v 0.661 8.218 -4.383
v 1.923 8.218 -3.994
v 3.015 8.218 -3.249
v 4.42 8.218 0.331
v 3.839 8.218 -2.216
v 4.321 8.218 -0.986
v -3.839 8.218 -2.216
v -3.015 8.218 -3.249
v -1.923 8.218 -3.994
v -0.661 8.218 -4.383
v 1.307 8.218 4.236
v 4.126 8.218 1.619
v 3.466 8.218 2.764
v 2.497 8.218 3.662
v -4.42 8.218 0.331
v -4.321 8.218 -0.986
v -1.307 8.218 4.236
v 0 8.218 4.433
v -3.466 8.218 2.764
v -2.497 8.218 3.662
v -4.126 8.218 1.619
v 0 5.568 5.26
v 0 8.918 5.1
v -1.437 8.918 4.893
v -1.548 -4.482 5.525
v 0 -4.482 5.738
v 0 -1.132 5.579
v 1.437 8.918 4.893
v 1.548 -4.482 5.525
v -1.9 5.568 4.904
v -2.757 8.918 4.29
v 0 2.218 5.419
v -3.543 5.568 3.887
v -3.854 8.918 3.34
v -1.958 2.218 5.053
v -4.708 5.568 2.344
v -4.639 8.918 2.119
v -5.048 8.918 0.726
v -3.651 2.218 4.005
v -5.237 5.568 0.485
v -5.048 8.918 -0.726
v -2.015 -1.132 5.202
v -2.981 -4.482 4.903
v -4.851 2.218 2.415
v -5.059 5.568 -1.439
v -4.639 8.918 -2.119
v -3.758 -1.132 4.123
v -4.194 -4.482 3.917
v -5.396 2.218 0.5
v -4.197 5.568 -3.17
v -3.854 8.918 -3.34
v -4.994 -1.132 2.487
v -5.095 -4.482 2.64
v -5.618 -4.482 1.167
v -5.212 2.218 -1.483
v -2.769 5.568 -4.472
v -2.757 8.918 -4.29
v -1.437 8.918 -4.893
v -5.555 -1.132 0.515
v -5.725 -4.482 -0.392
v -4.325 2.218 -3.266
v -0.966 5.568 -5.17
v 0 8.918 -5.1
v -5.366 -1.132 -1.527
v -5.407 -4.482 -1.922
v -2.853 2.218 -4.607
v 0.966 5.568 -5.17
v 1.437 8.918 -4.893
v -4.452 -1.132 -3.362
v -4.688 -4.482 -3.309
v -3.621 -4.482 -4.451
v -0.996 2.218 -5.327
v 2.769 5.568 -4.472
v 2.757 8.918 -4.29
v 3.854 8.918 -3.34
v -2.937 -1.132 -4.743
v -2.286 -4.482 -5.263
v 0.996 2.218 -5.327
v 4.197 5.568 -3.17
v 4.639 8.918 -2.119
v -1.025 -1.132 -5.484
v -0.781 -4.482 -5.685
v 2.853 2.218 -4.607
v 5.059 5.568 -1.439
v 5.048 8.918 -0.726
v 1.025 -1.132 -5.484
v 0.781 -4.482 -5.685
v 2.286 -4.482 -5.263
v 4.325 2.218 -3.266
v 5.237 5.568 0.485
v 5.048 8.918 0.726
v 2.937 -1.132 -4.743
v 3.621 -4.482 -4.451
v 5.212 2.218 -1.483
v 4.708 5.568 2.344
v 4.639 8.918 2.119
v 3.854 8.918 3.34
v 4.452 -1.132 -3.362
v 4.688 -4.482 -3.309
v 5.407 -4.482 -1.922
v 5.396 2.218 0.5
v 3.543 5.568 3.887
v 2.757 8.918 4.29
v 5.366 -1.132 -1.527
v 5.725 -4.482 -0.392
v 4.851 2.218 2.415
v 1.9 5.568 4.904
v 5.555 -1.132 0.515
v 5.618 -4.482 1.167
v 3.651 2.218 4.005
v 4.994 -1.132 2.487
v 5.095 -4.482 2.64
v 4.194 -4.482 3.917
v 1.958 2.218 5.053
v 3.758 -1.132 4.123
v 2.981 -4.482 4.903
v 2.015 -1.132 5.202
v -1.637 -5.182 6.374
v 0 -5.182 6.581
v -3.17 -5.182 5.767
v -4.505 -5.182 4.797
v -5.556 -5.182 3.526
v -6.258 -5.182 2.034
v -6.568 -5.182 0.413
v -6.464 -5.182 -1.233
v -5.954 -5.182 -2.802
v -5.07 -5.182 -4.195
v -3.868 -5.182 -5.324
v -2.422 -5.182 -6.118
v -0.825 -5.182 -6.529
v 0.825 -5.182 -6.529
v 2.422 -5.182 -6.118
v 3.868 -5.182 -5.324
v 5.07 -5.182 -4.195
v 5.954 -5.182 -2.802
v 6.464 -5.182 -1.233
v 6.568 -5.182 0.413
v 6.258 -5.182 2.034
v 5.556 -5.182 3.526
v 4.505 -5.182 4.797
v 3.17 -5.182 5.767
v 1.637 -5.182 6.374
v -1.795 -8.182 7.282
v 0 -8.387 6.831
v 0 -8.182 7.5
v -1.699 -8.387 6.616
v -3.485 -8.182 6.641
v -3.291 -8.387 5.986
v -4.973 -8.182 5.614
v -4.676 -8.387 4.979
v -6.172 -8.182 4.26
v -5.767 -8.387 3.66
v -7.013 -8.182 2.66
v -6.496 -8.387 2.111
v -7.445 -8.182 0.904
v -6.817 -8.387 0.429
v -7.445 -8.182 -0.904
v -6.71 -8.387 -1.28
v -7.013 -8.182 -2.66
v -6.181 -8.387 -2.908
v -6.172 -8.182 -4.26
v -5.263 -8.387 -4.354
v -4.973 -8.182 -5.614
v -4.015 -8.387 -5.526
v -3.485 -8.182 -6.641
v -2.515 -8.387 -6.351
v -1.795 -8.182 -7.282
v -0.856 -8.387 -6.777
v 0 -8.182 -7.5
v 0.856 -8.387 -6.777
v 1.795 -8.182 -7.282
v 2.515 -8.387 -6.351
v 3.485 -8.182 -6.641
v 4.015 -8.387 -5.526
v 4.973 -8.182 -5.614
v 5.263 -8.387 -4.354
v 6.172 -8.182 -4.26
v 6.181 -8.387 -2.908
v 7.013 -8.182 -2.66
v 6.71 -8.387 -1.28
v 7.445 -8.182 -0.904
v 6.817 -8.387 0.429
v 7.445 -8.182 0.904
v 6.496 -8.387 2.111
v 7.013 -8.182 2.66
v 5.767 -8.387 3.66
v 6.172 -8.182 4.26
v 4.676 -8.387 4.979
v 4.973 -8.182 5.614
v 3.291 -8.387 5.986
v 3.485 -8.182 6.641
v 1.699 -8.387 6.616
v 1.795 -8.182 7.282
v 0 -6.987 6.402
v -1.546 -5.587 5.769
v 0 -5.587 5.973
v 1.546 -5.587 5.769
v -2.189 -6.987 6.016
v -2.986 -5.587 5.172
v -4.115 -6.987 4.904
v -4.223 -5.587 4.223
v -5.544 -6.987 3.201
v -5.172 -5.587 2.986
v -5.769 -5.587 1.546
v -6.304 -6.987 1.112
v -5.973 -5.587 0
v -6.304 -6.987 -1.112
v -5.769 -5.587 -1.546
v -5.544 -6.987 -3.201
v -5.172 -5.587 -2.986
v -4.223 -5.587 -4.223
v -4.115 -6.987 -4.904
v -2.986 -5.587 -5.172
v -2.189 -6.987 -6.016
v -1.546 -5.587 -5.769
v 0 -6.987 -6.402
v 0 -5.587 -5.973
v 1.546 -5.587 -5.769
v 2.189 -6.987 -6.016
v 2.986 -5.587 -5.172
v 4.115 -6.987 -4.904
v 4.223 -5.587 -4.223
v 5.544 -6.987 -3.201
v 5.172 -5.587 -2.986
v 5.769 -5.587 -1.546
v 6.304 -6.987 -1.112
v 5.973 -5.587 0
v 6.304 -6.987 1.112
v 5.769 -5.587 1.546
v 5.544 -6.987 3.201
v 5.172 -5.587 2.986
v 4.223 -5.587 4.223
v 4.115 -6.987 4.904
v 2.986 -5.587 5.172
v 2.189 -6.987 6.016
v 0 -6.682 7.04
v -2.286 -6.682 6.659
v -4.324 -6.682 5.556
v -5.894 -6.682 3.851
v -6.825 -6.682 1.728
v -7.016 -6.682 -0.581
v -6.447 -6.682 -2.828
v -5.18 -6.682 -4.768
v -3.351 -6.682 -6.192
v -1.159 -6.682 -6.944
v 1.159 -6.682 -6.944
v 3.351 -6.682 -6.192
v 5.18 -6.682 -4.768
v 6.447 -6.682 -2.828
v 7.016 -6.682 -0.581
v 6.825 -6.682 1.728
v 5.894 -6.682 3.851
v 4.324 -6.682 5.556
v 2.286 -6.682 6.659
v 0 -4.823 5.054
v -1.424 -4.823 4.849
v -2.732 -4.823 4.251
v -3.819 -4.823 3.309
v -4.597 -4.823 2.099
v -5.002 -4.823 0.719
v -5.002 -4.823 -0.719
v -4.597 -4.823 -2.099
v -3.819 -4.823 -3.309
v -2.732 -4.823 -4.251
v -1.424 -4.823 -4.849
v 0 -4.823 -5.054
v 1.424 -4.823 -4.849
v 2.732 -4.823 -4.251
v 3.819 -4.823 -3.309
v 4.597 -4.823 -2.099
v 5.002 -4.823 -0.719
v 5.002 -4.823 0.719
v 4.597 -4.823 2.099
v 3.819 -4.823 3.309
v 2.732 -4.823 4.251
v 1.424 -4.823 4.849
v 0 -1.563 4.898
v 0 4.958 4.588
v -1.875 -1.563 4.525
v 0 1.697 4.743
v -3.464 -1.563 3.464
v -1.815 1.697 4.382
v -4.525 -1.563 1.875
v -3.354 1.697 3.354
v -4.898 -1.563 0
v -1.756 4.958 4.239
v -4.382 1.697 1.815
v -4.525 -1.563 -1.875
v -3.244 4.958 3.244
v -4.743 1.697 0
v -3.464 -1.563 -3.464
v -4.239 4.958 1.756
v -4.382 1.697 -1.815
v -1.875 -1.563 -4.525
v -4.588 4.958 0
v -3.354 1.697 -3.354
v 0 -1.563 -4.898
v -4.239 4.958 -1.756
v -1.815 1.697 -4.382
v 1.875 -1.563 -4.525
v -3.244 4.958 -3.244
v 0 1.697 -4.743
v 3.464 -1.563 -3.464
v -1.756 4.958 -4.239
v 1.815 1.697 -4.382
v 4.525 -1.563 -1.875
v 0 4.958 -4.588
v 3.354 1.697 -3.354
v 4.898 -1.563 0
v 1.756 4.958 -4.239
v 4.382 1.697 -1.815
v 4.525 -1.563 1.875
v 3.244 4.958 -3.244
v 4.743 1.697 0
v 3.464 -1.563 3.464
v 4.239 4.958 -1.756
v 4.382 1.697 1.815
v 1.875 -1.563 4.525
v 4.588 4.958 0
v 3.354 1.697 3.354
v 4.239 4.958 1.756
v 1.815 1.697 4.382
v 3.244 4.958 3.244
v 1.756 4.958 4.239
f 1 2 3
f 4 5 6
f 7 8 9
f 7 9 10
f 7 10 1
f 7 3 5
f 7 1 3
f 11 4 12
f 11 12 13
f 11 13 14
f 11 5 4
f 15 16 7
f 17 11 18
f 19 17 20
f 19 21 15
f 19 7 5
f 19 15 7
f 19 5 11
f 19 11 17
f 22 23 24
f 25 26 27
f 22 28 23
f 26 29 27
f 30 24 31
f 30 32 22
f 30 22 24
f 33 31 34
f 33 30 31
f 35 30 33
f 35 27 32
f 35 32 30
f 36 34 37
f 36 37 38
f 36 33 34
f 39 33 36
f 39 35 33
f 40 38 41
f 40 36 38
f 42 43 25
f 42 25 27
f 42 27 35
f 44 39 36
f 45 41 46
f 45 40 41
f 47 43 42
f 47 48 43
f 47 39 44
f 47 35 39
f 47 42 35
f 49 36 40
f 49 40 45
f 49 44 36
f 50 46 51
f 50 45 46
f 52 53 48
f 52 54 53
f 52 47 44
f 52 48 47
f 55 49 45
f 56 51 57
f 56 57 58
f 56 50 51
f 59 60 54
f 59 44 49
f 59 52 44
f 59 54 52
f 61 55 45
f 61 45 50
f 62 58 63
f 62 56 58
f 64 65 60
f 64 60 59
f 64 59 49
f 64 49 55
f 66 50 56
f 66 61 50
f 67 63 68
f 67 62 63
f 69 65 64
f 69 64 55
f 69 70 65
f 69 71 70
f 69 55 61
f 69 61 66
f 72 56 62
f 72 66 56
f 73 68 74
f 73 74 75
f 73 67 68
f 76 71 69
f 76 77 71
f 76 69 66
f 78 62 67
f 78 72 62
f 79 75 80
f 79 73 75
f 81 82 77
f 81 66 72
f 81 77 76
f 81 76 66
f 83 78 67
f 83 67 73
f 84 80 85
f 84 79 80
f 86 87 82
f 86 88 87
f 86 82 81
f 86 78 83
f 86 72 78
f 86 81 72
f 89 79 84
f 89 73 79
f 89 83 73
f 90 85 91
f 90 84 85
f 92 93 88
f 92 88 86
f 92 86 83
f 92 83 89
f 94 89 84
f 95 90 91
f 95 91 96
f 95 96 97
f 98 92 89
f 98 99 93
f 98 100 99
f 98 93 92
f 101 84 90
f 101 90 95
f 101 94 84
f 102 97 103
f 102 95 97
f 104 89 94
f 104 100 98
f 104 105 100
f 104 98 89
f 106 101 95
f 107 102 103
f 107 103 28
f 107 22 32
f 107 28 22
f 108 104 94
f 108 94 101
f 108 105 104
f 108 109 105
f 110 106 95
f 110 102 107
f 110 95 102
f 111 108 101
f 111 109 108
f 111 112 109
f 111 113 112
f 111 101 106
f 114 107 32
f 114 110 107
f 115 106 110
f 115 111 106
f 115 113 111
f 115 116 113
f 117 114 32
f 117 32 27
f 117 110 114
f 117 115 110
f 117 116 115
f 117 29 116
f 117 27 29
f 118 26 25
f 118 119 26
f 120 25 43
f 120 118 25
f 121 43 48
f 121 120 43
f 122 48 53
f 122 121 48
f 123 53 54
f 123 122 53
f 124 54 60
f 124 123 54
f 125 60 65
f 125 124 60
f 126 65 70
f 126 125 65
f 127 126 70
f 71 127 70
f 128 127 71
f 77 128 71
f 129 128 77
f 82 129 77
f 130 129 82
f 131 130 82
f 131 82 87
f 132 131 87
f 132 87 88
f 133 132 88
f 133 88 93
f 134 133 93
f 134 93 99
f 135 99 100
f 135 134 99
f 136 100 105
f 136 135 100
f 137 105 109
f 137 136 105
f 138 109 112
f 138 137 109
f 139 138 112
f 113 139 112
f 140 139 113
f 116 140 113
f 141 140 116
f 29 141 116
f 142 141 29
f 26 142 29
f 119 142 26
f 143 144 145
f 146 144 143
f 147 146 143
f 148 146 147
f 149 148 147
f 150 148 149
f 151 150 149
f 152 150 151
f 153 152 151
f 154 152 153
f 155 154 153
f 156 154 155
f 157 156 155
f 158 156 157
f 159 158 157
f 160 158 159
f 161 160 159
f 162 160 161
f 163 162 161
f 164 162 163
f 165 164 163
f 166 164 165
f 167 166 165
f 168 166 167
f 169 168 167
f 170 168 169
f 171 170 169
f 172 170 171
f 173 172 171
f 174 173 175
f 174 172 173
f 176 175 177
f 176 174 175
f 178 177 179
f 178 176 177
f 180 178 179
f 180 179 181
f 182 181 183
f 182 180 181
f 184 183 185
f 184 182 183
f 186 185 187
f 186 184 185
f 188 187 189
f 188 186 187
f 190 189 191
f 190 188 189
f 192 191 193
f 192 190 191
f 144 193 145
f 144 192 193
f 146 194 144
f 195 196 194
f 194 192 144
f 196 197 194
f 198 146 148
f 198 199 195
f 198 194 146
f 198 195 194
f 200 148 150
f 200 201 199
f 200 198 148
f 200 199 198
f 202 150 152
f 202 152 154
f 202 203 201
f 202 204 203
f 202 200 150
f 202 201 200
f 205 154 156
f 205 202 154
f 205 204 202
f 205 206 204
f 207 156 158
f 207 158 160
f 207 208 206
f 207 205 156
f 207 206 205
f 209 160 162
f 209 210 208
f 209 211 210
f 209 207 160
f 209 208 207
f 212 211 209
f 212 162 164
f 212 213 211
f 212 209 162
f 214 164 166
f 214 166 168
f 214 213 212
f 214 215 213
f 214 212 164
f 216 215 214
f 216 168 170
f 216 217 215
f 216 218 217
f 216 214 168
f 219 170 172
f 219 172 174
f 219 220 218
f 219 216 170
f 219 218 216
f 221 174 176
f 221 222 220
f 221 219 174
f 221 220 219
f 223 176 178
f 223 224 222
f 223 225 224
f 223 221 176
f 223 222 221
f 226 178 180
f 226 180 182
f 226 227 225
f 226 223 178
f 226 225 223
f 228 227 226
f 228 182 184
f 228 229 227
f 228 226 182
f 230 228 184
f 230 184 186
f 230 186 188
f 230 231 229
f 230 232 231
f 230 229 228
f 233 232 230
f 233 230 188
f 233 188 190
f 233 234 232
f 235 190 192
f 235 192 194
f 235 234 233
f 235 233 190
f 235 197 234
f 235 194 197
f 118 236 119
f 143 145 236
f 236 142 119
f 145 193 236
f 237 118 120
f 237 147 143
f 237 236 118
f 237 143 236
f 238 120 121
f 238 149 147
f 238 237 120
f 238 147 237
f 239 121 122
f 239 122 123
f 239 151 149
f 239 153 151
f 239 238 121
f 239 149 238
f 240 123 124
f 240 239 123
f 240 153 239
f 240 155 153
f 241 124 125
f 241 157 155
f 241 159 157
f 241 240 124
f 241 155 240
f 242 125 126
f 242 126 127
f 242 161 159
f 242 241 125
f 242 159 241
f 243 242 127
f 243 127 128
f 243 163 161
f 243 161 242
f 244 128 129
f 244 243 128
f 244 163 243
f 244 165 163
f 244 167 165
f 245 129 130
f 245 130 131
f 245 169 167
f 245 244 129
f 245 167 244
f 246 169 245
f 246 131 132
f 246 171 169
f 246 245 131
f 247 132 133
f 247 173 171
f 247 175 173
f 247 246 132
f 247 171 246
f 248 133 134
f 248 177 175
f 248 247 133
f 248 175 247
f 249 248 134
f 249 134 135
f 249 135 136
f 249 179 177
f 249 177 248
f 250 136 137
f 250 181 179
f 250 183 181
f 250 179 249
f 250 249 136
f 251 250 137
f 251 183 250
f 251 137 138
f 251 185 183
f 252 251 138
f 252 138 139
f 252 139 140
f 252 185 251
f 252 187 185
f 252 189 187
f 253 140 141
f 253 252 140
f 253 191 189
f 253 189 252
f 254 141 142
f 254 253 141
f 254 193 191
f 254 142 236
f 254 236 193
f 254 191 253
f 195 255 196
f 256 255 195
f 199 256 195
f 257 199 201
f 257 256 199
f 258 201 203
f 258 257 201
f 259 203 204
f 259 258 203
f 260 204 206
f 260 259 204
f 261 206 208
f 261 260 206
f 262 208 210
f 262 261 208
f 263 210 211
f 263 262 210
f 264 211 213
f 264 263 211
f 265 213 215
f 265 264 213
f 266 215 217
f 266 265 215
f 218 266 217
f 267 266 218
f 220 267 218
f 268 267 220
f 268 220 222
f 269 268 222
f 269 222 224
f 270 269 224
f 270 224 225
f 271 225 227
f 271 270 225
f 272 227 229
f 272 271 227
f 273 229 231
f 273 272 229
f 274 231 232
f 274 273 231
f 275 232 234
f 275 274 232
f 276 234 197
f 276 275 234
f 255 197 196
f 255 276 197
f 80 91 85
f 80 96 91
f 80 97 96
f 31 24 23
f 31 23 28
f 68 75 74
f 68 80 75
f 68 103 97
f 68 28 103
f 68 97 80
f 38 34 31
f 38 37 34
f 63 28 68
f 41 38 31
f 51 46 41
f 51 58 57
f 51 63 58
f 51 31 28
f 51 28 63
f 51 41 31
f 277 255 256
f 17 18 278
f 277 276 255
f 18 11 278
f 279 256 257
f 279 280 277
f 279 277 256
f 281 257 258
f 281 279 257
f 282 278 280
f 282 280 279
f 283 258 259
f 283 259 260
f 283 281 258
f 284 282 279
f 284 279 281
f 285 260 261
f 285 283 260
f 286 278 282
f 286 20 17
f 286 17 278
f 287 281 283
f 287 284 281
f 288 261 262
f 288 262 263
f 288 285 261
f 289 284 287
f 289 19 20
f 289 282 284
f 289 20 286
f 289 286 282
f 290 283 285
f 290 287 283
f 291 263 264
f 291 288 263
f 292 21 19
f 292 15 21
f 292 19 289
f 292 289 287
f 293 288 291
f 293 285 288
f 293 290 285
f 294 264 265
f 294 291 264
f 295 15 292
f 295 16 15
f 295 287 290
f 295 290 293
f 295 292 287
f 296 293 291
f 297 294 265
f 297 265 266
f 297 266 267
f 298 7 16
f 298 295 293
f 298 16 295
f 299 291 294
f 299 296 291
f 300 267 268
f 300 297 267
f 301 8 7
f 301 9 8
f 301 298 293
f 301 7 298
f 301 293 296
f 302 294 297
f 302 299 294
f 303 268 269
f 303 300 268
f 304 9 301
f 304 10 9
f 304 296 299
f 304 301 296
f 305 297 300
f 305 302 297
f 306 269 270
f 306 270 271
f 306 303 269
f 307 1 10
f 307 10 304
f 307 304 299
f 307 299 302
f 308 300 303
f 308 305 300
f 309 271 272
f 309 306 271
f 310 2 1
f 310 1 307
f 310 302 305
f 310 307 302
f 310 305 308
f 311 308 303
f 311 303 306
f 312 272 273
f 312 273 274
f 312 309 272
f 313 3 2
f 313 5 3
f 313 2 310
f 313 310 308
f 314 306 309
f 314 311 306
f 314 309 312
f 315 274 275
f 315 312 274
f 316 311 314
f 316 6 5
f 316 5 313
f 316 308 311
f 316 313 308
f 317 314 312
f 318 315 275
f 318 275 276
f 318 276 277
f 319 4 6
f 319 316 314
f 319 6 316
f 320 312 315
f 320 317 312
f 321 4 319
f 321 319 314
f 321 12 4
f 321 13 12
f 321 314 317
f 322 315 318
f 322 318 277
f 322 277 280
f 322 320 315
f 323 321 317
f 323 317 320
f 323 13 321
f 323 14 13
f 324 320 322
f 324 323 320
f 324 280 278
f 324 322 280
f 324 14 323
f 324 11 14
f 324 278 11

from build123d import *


with BuildPart() as part:
    # Schizzo1 → Rivoluzione1 (revolve)
    with BuildSketch(Plane.XY, mode=Mode.PRIVATE) as rivoluzione1_sk:
        Polygon((6.830726988, -8.387277259), (5.972508756, -5.587032245), (5.05357518, -4.82347792), (4.432541097, 8.217841328), (0, 8.217841328), (0, 8.917841328), (5.1, 8.917841328), (5.738114638, -4.482158672), (6.580560922, -5.182158672), (7.5, -8.182158672), align=None)
    revolve(rivoluzione1_sk.sketch.rotate(Axis((0, 55, 0), (0, -1, 0)), 90), axis=Axis((0, 55, 0), (0, -1, 0)))


solid = part.part
